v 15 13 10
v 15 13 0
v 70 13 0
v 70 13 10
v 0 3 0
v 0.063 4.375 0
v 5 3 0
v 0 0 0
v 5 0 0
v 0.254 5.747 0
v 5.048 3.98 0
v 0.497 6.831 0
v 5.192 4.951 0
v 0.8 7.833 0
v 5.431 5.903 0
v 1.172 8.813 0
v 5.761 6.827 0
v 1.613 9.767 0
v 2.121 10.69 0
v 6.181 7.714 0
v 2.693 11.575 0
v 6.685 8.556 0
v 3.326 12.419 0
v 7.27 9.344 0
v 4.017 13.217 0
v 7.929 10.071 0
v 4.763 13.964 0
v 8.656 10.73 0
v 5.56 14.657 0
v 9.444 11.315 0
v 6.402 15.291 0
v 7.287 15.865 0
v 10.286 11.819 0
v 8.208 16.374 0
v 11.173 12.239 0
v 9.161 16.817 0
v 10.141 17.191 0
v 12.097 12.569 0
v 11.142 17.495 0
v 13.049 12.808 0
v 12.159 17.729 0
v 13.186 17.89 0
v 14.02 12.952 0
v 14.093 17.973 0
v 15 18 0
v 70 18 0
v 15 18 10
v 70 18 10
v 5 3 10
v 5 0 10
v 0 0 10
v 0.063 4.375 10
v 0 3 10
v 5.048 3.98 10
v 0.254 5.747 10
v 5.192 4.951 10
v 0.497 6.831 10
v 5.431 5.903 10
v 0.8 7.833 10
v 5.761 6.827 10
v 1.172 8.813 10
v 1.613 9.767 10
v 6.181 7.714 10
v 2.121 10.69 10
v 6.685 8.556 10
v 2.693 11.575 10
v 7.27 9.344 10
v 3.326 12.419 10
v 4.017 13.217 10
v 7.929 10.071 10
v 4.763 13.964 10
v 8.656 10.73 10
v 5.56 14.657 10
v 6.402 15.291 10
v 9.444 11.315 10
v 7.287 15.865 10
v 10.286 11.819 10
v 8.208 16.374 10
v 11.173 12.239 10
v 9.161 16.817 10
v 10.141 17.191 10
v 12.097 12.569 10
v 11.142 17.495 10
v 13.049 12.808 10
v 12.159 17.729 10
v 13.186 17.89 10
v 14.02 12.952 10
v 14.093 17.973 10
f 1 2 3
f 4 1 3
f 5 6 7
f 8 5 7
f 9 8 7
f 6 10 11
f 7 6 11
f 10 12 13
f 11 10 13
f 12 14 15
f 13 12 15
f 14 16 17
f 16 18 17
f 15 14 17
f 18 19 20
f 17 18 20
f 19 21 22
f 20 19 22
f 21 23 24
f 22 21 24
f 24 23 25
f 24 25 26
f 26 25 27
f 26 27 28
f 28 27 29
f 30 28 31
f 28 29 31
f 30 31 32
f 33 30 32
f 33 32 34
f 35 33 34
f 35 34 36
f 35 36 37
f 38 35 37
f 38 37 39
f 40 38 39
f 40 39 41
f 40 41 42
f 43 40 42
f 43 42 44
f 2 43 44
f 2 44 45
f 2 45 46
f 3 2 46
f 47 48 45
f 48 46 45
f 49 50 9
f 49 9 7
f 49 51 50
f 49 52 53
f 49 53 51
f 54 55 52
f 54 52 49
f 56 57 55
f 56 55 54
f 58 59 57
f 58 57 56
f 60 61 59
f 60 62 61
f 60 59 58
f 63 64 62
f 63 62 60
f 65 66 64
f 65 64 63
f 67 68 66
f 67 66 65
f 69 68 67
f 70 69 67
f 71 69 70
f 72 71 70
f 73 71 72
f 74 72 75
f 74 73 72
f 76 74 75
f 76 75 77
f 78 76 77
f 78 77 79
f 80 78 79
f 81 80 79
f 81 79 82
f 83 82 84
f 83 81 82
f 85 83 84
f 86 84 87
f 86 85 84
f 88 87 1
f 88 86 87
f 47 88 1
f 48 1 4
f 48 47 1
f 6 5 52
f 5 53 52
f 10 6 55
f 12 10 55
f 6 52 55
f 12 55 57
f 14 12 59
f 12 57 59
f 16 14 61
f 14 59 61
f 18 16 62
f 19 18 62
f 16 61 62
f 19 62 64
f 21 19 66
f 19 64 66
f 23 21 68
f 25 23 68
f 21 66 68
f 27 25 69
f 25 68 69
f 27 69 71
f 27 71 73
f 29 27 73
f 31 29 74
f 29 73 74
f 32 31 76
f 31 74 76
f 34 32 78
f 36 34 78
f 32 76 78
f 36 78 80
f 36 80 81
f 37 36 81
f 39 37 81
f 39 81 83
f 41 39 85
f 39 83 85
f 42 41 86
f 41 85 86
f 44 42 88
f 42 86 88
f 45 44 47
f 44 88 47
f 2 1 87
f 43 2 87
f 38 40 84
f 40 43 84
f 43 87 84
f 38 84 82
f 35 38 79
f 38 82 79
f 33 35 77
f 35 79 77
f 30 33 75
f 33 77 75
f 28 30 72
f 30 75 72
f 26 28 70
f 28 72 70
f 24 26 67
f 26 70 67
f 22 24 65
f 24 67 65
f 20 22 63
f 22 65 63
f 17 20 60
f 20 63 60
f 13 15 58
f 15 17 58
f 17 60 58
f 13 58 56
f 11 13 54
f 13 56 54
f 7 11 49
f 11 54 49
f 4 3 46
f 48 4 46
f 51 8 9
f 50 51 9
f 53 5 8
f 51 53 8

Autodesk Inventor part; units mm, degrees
ref_plane "YZ Plane" through (0, 0, 0) normal (1, 0, 0) x (0, 1, 0)
ref_plane "XZ Plane" through (0, 0, 0) normal (0, 1, 0) x (-1, 0, 0)
ref_plane "XY Plane" through (0, 0, 0) normal (0, 0, 1) x (1, 0, 0)
sketch "Sketch2" plane through (0, 0, 0) normal (0, 0, 1) x (1, 0, 0)
  line L0 (0, 0) -> (5, 0)
  line L1 (5, 0) -> (5, 13)
  line L2 (0, 9.9166) -> (0, 0)
  line L3 (5, 13) -> (70, 13)
  line L4 (70, 13) -> (70, 18)
  line L5 (70, 18) -> (0, 18)
  line L6 (0, 18) -> (0, 9.9166)
  dimension "d9" = 5
  dimension "d10" = 65
  dimension "d11" = 13
  dimension "d16" = 5
extrude "Extrusion2" add sketch "Sketch2" along normal blind 10
fillet "Fillet1" radius 15 1 edges at (0, 18, 5)
fillet "Fillet2" radius 10 1 edges at (5, 13, 5)
properties part number "zweef-01"
